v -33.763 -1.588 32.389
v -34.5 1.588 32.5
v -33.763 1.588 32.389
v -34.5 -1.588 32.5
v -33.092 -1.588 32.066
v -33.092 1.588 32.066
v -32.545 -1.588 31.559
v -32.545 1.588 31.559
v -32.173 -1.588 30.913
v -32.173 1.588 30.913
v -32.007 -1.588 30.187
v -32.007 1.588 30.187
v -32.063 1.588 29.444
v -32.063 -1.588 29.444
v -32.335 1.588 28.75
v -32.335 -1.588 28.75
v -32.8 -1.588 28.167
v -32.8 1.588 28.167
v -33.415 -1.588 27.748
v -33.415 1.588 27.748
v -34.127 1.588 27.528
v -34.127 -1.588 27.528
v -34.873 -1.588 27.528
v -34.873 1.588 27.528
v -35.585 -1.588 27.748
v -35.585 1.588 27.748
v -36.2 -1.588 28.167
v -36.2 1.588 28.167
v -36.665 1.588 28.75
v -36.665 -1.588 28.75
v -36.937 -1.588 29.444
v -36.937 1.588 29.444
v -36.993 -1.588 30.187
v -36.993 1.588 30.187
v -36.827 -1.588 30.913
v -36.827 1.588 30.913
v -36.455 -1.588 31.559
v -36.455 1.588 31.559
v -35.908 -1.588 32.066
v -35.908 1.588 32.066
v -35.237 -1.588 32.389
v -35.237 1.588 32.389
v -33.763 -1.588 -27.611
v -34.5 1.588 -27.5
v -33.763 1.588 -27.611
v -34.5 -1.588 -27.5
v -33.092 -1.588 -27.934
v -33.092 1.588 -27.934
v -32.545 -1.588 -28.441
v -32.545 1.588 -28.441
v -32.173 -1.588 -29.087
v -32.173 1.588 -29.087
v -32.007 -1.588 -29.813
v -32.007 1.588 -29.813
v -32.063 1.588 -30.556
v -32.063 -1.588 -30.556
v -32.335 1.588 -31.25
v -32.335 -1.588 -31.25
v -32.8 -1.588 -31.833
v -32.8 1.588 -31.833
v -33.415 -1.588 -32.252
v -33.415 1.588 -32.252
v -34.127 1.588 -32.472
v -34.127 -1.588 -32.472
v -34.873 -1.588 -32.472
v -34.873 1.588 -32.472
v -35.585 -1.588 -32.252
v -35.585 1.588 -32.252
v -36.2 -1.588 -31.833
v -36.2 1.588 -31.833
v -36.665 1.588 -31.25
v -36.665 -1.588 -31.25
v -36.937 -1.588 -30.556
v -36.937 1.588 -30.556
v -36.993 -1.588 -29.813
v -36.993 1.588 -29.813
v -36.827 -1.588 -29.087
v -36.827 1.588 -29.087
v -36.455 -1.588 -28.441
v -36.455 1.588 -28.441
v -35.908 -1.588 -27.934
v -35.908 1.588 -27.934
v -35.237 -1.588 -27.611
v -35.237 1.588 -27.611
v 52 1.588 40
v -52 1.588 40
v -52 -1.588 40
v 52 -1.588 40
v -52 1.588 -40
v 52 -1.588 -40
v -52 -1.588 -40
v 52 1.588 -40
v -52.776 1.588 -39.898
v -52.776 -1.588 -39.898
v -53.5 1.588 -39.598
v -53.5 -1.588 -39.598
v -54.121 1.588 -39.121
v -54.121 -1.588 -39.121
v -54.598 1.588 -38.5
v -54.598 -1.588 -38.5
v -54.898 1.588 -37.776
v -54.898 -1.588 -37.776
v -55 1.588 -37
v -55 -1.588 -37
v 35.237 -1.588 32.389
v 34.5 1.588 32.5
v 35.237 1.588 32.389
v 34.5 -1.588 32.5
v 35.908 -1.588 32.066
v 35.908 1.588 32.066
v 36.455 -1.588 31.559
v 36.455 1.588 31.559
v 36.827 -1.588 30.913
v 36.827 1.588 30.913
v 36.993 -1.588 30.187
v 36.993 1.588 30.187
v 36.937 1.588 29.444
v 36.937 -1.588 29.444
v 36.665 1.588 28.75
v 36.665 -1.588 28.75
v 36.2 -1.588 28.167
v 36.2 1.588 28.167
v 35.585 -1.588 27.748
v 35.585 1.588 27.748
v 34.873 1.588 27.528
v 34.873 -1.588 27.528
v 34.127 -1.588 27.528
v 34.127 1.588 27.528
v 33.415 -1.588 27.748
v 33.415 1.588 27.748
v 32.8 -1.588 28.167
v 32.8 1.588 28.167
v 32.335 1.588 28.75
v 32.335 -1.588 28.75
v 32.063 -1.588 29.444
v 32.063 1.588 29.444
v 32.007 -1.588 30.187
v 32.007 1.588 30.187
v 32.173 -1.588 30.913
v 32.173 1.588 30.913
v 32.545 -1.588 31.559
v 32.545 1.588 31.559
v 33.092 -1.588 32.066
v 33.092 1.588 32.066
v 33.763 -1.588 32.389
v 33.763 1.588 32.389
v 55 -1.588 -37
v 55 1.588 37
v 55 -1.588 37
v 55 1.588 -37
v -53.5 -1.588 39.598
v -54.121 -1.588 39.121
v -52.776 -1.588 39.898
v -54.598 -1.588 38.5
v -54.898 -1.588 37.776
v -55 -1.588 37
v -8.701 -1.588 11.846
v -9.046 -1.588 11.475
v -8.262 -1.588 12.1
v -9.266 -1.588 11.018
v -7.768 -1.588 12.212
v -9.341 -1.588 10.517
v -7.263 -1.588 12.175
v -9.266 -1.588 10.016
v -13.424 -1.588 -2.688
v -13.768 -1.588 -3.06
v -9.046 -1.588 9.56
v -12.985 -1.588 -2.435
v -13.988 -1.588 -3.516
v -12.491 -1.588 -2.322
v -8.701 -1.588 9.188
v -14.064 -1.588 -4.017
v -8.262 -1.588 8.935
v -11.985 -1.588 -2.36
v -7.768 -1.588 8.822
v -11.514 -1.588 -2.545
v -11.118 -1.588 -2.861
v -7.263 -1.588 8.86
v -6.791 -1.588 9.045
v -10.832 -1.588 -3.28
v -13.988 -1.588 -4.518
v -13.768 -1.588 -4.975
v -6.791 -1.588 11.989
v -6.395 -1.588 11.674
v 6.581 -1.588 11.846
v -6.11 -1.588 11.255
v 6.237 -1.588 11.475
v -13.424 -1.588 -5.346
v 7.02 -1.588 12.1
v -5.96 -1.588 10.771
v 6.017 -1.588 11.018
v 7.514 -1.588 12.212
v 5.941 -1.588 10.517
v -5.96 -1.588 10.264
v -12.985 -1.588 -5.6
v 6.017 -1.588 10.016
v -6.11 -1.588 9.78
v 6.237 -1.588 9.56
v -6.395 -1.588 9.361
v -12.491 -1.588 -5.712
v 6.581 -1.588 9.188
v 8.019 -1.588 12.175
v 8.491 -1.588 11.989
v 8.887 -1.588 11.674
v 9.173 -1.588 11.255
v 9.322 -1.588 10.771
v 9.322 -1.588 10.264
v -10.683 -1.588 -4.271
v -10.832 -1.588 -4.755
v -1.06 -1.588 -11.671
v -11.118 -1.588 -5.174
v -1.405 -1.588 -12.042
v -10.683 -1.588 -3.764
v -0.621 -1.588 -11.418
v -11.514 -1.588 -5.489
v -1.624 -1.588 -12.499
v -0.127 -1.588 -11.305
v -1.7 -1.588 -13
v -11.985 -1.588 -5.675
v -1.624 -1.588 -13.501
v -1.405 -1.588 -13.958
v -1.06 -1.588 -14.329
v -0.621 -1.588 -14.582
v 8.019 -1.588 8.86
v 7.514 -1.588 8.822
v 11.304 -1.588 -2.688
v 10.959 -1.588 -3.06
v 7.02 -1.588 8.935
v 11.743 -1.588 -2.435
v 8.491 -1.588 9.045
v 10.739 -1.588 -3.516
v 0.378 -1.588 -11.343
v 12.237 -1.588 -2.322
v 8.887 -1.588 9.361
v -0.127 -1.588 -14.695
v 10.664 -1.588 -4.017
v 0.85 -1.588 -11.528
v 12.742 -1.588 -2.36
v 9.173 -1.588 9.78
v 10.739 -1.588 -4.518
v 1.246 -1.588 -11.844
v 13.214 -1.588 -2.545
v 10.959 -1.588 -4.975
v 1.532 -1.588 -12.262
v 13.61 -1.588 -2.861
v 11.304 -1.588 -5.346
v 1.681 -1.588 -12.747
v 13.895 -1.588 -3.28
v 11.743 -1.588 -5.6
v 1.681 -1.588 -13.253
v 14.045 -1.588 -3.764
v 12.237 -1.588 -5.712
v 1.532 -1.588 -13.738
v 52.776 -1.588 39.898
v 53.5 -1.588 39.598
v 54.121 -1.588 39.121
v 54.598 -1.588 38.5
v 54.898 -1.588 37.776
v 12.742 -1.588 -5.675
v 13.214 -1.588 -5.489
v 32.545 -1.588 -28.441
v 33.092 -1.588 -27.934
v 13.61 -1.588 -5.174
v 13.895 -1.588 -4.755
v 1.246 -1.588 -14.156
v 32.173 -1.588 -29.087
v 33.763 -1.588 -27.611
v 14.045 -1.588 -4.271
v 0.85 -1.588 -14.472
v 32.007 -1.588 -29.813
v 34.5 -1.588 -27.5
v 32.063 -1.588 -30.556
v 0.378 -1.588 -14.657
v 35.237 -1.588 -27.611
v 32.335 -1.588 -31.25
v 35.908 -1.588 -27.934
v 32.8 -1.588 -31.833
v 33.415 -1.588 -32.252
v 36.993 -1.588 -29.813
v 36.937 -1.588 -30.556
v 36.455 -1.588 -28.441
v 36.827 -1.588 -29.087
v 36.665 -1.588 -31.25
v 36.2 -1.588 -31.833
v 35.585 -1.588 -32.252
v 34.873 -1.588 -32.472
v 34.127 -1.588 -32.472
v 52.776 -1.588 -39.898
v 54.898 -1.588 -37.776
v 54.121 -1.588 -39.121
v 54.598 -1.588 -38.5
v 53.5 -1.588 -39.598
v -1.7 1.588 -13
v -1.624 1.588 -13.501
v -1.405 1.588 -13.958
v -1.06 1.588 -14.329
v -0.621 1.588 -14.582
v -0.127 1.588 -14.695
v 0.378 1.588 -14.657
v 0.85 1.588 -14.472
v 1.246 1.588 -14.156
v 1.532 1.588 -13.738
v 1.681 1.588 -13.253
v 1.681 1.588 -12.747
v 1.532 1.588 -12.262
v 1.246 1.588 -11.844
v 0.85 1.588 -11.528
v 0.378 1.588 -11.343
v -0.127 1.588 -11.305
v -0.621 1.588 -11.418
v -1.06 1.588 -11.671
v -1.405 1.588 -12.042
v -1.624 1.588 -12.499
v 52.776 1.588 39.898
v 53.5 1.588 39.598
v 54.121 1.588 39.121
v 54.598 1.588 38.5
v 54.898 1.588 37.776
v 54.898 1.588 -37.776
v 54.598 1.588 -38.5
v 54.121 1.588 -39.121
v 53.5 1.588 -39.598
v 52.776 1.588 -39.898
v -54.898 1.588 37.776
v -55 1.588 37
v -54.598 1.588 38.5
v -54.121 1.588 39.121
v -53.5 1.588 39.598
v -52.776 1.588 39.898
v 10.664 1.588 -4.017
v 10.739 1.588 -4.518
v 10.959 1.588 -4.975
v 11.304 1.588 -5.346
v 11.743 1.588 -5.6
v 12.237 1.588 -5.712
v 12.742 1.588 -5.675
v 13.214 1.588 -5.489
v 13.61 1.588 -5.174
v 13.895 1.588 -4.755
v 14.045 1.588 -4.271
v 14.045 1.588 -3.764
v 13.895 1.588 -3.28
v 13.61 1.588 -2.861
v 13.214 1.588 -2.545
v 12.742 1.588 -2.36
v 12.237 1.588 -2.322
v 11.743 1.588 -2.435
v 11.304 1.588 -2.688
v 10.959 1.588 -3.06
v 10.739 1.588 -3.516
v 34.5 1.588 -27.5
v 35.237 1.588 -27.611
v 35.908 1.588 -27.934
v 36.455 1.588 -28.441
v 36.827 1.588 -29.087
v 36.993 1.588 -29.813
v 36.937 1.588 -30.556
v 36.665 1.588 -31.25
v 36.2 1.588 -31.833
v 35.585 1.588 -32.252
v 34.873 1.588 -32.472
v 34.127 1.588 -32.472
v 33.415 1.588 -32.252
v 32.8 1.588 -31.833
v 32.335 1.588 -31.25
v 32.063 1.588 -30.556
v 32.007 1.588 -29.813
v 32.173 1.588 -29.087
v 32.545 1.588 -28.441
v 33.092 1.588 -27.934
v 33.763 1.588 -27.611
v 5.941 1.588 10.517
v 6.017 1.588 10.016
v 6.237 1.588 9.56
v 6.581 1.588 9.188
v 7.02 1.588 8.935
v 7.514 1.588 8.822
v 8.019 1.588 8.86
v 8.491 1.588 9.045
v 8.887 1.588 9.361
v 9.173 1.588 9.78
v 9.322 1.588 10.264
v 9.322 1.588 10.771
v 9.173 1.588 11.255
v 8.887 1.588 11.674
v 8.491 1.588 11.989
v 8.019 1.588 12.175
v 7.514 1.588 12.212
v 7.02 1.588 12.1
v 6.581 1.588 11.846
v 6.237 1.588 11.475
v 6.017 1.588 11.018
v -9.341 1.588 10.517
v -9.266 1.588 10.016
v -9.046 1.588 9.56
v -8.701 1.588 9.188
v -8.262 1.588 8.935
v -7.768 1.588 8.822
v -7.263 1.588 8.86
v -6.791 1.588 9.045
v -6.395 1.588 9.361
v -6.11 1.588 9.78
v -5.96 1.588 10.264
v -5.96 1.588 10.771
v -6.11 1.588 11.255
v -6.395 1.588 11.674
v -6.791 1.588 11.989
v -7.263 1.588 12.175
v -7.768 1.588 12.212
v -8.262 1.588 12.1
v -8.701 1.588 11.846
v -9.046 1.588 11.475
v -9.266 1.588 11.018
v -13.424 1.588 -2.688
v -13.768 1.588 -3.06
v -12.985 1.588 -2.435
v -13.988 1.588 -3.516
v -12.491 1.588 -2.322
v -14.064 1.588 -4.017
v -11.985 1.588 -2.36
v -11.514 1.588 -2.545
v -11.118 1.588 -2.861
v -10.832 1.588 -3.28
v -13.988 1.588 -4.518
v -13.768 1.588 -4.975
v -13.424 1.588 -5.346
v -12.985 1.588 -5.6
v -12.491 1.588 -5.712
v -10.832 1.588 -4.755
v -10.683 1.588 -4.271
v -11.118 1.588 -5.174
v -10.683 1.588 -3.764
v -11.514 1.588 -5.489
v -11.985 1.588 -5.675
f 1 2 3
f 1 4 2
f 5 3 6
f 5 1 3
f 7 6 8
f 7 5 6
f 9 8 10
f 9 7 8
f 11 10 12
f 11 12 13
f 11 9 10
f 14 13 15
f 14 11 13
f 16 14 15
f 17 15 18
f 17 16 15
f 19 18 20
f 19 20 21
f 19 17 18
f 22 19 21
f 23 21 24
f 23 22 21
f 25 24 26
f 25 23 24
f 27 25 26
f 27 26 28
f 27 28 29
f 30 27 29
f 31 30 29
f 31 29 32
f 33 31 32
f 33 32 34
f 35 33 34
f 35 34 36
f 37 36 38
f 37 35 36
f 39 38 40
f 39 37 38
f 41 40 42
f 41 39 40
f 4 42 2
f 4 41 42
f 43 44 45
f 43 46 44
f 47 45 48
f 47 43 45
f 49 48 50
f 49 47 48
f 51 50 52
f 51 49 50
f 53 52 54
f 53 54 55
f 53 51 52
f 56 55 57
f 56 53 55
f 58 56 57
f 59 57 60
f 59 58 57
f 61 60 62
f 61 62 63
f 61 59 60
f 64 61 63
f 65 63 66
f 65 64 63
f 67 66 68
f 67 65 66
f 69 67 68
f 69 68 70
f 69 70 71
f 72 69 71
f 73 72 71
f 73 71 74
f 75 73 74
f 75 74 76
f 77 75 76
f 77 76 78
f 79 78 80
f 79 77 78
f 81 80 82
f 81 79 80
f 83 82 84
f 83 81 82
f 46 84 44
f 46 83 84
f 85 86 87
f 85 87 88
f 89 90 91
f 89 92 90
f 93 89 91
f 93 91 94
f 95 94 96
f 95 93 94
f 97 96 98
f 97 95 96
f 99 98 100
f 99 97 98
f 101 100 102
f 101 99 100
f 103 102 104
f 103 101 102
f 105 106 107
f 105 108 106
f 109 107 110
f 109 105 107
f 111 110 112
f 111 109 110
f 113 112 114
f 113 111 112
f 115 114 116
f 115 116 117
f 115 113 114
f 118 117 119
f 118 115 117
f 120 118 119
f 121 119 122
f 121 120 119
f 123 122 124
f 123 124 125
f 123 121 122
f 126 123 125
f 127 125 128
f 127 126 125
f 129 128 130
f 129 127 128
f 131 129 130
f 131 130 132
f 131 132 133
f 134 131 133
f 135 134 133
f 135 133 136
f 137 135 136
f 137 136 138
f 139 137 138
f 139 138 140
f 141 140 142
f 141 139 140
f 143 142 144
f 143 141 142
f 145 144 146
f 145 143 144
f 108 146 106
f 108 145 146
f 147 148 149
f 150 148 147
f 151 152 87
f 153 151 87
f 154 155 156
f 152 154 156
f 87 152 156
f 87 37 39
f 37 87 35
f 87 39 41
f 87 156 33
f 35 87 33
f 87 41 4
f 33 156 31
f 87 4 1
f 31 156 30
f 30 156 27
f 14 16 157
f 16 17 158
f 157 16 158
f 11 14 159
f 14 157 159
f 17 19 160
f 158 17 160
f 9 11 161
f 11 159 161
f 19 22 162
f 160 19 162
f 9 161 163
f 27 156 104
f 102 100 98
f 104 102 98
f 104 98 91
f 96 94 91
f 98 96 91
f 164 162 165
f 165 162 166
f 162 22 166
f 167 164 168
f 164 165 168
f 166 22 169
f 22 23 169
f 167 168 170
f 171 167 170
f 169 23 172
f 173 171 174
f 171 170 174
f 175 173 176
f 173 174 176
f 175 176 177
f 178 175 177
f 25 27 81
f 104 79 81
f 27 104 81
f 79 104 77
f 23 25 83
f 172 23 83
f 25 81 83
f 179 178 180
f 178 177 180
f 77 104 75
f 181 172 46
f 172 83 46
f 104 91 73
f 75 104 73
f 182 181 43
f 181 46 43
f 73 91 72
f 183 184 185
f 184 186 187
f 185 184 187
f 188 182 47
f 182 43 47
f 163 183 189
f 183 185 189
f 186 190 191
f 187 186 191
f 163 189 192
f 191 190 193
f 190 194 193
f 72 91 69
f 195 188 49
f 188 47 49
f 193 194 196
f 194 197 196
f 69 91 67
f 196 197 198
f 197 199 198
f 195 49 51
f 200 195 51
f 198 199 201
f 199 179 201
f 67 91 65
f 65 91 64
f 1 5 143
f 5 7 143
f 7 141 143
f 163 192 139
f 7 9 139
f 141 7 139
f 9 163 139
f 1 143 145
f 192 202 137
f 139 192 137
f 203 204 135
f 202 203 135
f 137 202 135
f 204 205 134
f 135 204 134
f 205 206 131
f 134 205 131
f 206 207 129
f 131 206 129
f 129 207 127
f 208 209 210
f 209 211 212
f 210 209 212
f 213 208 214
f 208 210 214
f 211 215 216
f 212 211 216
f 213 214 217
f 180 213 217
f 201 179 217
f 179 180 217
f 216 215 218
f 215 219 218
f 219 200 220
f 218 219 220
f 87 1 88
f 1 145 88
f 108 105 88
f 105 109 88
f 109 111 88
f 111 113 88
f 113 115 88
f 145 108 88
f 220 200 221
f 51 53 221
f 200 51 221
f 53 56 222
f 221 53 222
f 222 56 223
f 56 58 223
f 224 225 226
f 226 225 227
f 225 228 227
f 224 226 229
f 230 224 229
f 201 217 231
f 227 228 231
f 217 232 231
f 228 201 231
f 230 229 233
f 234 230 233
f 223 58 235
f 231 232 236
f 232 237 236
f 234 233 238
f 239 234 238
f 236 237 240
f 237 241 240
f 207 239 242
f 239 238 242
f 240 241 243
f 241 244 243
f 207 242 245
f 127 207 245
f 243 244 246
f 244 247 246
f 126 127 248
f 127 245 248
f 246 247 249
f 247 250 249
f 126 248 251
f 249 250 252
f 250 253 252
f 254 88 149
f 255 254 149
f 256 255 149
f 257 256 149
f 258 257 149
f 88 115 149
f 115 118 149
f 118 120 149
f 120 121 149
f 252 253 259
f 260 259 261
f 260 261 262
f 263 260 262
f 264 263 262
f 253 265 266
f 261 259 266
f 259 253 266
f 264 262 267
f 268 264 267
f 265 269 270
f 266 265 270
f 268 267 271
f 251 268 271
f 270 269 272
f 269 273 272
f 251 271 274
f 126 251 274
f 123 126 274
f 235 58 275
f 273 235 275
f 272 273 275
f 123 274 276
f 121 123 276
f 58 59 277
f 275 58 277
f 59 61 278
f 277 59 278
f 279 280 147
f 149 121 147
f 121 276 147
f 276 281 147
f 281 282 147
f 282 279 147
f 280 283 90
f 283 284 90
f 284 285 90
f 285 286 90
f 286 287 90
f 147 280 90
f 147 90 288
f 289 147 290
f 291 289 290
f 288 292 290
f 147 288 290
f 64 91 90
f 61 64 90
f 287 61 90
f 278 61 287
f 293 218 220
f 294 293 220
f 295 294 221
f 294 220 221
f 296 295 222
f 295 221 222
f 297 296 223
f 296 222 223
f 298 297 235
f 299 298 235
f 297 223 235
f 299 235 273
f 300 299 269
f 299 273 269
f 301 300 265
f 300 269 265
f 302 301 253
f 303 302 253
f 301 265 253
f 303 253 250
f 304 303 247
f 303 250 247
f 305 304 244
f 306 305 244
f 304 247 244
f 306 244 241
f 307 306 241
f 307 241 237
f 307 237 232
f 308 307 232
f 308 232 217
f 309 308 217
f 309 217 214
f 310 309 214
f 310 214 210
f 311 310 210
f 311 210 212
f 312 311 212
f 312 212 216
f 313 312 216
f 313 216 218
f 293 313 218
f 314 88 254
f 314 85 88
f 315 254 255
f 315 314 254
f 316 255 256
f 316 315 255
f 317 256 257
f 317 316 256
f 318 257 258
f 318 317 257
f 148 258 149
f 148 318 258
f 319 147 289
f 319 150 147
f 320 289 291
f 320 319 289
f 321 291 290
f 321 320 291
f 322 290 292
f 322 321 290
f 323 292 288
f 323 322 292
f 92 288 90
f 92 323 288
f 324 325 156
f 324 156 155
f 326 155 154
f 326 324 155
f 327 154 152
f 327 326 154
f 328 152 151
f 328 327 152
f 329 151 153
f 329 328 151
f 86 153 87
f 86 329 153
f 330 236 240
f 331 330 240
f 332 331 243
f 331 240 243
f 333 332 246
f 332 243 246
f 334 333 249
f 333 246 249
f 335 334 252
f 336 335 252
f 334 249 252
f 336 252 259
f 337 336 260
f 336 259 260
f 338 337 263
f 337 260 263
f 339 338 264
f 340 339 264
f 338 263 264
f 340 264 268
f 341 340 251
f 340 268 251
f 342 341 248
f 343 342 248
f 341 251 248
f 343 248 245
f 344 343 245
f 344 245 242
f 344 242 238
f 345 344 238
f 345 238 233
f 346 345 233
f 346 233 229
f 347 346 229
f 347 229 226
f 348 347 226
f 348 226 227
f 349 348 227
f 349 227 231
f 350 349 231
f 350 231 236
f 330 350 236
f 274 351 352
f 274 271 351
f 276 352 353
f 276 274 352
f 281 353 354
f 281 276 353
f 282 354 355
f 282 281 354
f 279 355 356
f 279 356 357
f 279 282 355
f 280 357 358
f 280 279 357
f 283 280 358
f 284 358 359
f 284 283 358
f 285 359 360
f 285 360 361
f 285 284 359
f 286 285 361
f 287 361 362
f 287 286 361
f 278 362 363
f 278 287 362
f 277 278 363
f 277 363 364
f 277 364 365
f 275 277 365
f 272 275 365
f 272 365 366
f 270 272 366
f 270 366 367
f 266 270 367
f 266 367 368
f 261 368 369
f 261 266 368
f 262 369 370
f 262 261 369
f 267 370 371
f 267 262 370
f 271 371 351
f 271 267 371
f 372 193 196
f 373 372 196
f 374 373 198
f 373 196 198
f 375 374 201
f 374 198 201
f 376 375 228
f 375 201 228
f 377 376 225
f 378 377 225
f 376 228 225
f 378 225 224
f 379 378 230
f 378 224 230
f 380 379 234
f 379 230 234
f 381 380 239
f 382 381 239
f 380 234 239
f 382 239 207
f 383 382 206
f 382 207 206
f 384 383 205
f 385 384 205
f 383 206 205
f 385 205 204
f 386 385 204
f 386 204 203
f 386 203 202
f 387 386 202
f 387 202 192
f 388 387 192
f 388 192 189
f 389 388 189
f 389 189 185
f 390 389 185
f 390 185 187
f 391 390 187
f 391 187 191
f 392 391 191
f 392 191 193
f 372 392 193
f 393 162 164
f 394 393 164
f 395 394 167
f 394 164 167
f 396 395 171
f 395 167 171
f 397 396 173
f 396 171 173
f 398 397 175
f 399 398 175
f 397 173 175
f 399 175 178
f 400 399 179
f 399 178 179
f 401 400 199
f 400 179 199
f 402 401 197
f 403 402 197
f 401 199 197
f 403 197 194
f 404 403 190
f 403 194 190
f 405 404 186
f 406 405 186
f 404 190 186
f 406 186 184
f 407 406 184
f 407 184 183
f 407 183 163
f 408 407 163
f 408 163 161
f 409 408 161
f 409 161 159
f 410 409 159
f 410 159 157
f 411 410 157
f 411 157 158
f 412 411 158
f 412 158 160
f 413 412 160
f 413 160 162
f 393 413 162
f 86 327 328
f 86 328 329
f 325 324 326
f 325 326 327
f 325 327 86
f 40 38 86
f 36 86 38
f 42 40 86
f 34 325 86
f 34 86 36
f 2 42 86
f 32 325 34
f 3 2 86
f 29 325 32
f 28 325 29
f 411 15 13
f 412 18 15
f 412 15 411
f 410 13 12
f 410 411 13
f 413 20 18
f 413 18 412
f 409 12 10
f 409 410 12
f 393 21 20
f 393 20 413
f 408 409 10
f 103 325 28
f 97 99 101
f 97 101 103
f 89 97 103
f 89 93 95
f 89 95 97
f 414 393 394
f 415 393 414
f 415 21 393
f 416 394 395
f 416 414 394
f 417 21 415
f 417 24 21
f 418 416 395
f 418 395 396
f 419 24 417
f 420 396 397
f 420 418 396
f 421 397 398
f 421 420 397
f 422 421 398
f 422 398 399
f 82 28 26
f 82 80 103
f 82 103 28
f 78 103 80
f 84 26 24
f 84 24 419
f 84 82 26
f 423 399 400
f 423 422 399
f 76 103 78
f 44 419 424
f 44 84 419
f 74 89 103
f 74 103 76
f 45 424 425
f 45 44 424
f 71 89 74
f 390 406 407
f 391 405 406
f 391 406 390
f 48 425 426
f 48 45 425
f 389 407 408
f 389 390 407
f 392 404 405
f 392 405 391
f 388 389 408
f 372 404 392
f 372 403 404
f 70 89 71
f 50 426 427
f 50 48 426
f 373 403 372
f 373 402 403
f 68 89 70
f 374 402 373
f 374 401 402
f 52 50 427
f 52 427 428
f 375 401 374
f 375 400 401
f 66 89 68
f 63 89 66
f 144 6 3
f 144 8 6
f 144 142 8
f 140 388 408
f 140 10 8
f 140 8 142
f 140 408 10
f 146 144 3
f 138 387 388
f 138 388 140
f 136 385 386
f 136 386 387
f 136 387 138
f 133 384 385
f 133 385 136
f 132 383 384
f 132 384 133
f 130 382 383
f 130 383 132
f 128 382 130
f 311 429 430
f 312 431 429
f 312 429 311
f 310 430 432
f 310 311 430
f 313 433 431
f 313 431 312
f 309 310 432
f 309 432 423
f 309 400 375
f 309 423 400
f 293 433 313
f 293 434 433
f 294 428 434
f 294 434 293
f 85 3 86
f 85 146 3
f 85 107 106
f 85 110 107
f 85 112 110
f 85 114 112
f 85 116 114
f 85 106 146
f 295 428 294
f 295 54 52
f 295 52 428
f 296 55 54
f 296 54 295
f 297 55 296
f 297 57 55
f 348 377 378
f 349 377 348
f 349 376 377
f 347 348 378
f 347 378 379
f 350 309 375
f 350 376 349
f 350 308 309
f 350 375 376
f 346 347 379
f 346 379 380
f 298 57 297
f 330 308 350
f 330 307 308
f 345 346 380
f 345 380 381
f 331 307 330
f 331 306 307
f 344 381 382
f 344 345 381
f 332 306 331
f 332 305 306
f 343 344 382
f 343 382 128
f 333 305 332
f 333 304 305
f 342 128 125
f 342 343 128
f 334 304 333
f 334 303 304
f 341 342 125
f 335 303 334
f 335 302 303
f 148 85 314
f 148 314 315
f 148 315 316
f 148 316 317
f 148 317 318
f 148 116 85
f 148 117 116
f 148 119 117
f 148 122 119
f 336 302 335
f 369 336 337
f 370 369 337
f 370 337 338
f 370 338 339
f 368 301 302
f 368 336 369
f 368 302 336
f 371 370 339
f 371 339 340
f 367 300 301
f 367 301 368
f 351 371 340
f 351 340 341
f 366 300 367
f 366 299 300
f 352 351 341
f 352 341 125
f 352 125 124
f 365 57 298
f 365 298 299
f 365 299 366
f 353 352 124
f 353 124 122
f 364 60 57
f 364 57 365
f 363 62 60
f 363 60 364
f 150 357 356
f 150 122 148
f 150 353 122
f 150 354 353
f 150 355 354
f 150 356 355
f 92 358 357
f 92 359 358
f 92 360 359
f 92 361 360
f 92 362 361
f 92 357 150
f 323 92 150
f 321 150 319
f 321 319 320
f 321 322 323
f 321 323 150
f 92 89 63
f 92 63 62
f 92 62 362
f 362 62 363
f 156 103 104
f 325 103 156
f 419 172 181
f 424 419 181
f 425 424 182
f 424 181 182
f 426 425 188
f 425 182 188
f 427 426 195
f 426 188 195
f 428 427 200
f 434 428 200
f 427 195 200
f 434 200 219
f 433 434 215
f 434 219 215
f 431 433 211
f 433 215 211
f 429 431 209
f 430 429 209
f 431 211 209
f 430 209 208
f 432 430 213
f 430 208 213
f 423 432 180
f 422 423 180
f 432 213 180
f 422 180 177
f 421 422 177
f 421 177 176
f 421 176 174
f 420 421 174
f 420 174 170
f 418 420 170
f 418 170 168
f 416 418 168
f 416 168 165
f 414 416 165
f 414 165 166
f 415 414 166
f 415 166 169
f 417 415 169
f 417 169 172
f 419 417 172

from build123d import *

# Parameters (mm, degrees)
CROQUIS1_R                       = 2.5
SALIENTE_EXTRUIR1_DEPTH          = 1.5875
TALADRO_DE_MARGEN_PARA_M31_D     = 3.4
TALADRO_DE_MARGEN_PARA_M31_DEPTH = 10
TALADRO_DE_MARGEN_PARA_M31_TIP   = 1.021463052


with BuildPart() as part:
    # Croquis1 → Saliente-Extruir1 (new, symmetric)
    with BuildSketch(Plane(origin=(0, 0, 0), x_dir=(1, 0, 0), z_dir=(0, 1, 0))):
        with BuildLine():
            Line((52, 40), (-52, 40))
            ThreePointArc((-52, 40), (-54.121320344, 39.121320344), (-55, 37))
            Line((-55, 37), (-55, -37))
            ThreePointArc((-55, -37), (-54.121320344, -39.121320344), (-52, -40))
            Line((-52, -40), (52, -40))
            ThreePointArc((52, -40), (54.121320344, -39.121320344), (55, -37))
            Line((55, -37), (55, 37))
            ThreePointArc((55, 37), (54.121320344, 39.121320344), (52, 40))
        make_face()
        with Locations(Location((34.5, 30, 0), (0, 0, 270))):
            Circle(CROQUIS1_R, mode=Mode.SUBTRACT)
        with Locations(Location((34.5, -30, 0), (0, 0, 270))):
            Circle(CROQUIS1_R, mode=Mode.SUBTRACT)
        with Locations(Location((-34.5, -30, 0), (0, 0, 270))):
            Circle(CROQUIS1_R, mode=Mode.SUBTRACT)
        with Locations(Location((-34.5, 30, 0), (0, 0, 270))):
            Circle(CROQUIS1_R, mode=Mode.SUBTRACT)
    extrude(amount=SALIENTE_EXTRUIR1_DEPTH, both=True)

    # Taladro de margen para M31
    with Locations(Plane(origin=(0, 1.5875, 0), x_dir=(1, 0, 0), z_dir=(0, 1, 0))):
        with Locations((0, 13), (12.363734712, 4.017220927), (7.64120828, -10.517220927), (-7.64120828, -10.517220927), (-12.363734712, 4.017220927)):
            Hole(TALADRO_DE_MARGEN_PARA_M31_D / 2, depth=TALADRO_DE_MARGEN_PARA_M31_DEPTH)
            with Locations((0, 0, -(TALADRO_DE_MARGEN_PARA_M31_DEPTH + TALADRO_DE_MARGEN_PARA_M31_TIP / 2))):  # 118° drill point
                Cone(0, TALADRO_DE_MARGEN_PARA_M31_D / 2, TALADRO_DE_MARGEN_PARA_M31_TIP, mode=Mode.SUBTRACT)


solid = part.part
